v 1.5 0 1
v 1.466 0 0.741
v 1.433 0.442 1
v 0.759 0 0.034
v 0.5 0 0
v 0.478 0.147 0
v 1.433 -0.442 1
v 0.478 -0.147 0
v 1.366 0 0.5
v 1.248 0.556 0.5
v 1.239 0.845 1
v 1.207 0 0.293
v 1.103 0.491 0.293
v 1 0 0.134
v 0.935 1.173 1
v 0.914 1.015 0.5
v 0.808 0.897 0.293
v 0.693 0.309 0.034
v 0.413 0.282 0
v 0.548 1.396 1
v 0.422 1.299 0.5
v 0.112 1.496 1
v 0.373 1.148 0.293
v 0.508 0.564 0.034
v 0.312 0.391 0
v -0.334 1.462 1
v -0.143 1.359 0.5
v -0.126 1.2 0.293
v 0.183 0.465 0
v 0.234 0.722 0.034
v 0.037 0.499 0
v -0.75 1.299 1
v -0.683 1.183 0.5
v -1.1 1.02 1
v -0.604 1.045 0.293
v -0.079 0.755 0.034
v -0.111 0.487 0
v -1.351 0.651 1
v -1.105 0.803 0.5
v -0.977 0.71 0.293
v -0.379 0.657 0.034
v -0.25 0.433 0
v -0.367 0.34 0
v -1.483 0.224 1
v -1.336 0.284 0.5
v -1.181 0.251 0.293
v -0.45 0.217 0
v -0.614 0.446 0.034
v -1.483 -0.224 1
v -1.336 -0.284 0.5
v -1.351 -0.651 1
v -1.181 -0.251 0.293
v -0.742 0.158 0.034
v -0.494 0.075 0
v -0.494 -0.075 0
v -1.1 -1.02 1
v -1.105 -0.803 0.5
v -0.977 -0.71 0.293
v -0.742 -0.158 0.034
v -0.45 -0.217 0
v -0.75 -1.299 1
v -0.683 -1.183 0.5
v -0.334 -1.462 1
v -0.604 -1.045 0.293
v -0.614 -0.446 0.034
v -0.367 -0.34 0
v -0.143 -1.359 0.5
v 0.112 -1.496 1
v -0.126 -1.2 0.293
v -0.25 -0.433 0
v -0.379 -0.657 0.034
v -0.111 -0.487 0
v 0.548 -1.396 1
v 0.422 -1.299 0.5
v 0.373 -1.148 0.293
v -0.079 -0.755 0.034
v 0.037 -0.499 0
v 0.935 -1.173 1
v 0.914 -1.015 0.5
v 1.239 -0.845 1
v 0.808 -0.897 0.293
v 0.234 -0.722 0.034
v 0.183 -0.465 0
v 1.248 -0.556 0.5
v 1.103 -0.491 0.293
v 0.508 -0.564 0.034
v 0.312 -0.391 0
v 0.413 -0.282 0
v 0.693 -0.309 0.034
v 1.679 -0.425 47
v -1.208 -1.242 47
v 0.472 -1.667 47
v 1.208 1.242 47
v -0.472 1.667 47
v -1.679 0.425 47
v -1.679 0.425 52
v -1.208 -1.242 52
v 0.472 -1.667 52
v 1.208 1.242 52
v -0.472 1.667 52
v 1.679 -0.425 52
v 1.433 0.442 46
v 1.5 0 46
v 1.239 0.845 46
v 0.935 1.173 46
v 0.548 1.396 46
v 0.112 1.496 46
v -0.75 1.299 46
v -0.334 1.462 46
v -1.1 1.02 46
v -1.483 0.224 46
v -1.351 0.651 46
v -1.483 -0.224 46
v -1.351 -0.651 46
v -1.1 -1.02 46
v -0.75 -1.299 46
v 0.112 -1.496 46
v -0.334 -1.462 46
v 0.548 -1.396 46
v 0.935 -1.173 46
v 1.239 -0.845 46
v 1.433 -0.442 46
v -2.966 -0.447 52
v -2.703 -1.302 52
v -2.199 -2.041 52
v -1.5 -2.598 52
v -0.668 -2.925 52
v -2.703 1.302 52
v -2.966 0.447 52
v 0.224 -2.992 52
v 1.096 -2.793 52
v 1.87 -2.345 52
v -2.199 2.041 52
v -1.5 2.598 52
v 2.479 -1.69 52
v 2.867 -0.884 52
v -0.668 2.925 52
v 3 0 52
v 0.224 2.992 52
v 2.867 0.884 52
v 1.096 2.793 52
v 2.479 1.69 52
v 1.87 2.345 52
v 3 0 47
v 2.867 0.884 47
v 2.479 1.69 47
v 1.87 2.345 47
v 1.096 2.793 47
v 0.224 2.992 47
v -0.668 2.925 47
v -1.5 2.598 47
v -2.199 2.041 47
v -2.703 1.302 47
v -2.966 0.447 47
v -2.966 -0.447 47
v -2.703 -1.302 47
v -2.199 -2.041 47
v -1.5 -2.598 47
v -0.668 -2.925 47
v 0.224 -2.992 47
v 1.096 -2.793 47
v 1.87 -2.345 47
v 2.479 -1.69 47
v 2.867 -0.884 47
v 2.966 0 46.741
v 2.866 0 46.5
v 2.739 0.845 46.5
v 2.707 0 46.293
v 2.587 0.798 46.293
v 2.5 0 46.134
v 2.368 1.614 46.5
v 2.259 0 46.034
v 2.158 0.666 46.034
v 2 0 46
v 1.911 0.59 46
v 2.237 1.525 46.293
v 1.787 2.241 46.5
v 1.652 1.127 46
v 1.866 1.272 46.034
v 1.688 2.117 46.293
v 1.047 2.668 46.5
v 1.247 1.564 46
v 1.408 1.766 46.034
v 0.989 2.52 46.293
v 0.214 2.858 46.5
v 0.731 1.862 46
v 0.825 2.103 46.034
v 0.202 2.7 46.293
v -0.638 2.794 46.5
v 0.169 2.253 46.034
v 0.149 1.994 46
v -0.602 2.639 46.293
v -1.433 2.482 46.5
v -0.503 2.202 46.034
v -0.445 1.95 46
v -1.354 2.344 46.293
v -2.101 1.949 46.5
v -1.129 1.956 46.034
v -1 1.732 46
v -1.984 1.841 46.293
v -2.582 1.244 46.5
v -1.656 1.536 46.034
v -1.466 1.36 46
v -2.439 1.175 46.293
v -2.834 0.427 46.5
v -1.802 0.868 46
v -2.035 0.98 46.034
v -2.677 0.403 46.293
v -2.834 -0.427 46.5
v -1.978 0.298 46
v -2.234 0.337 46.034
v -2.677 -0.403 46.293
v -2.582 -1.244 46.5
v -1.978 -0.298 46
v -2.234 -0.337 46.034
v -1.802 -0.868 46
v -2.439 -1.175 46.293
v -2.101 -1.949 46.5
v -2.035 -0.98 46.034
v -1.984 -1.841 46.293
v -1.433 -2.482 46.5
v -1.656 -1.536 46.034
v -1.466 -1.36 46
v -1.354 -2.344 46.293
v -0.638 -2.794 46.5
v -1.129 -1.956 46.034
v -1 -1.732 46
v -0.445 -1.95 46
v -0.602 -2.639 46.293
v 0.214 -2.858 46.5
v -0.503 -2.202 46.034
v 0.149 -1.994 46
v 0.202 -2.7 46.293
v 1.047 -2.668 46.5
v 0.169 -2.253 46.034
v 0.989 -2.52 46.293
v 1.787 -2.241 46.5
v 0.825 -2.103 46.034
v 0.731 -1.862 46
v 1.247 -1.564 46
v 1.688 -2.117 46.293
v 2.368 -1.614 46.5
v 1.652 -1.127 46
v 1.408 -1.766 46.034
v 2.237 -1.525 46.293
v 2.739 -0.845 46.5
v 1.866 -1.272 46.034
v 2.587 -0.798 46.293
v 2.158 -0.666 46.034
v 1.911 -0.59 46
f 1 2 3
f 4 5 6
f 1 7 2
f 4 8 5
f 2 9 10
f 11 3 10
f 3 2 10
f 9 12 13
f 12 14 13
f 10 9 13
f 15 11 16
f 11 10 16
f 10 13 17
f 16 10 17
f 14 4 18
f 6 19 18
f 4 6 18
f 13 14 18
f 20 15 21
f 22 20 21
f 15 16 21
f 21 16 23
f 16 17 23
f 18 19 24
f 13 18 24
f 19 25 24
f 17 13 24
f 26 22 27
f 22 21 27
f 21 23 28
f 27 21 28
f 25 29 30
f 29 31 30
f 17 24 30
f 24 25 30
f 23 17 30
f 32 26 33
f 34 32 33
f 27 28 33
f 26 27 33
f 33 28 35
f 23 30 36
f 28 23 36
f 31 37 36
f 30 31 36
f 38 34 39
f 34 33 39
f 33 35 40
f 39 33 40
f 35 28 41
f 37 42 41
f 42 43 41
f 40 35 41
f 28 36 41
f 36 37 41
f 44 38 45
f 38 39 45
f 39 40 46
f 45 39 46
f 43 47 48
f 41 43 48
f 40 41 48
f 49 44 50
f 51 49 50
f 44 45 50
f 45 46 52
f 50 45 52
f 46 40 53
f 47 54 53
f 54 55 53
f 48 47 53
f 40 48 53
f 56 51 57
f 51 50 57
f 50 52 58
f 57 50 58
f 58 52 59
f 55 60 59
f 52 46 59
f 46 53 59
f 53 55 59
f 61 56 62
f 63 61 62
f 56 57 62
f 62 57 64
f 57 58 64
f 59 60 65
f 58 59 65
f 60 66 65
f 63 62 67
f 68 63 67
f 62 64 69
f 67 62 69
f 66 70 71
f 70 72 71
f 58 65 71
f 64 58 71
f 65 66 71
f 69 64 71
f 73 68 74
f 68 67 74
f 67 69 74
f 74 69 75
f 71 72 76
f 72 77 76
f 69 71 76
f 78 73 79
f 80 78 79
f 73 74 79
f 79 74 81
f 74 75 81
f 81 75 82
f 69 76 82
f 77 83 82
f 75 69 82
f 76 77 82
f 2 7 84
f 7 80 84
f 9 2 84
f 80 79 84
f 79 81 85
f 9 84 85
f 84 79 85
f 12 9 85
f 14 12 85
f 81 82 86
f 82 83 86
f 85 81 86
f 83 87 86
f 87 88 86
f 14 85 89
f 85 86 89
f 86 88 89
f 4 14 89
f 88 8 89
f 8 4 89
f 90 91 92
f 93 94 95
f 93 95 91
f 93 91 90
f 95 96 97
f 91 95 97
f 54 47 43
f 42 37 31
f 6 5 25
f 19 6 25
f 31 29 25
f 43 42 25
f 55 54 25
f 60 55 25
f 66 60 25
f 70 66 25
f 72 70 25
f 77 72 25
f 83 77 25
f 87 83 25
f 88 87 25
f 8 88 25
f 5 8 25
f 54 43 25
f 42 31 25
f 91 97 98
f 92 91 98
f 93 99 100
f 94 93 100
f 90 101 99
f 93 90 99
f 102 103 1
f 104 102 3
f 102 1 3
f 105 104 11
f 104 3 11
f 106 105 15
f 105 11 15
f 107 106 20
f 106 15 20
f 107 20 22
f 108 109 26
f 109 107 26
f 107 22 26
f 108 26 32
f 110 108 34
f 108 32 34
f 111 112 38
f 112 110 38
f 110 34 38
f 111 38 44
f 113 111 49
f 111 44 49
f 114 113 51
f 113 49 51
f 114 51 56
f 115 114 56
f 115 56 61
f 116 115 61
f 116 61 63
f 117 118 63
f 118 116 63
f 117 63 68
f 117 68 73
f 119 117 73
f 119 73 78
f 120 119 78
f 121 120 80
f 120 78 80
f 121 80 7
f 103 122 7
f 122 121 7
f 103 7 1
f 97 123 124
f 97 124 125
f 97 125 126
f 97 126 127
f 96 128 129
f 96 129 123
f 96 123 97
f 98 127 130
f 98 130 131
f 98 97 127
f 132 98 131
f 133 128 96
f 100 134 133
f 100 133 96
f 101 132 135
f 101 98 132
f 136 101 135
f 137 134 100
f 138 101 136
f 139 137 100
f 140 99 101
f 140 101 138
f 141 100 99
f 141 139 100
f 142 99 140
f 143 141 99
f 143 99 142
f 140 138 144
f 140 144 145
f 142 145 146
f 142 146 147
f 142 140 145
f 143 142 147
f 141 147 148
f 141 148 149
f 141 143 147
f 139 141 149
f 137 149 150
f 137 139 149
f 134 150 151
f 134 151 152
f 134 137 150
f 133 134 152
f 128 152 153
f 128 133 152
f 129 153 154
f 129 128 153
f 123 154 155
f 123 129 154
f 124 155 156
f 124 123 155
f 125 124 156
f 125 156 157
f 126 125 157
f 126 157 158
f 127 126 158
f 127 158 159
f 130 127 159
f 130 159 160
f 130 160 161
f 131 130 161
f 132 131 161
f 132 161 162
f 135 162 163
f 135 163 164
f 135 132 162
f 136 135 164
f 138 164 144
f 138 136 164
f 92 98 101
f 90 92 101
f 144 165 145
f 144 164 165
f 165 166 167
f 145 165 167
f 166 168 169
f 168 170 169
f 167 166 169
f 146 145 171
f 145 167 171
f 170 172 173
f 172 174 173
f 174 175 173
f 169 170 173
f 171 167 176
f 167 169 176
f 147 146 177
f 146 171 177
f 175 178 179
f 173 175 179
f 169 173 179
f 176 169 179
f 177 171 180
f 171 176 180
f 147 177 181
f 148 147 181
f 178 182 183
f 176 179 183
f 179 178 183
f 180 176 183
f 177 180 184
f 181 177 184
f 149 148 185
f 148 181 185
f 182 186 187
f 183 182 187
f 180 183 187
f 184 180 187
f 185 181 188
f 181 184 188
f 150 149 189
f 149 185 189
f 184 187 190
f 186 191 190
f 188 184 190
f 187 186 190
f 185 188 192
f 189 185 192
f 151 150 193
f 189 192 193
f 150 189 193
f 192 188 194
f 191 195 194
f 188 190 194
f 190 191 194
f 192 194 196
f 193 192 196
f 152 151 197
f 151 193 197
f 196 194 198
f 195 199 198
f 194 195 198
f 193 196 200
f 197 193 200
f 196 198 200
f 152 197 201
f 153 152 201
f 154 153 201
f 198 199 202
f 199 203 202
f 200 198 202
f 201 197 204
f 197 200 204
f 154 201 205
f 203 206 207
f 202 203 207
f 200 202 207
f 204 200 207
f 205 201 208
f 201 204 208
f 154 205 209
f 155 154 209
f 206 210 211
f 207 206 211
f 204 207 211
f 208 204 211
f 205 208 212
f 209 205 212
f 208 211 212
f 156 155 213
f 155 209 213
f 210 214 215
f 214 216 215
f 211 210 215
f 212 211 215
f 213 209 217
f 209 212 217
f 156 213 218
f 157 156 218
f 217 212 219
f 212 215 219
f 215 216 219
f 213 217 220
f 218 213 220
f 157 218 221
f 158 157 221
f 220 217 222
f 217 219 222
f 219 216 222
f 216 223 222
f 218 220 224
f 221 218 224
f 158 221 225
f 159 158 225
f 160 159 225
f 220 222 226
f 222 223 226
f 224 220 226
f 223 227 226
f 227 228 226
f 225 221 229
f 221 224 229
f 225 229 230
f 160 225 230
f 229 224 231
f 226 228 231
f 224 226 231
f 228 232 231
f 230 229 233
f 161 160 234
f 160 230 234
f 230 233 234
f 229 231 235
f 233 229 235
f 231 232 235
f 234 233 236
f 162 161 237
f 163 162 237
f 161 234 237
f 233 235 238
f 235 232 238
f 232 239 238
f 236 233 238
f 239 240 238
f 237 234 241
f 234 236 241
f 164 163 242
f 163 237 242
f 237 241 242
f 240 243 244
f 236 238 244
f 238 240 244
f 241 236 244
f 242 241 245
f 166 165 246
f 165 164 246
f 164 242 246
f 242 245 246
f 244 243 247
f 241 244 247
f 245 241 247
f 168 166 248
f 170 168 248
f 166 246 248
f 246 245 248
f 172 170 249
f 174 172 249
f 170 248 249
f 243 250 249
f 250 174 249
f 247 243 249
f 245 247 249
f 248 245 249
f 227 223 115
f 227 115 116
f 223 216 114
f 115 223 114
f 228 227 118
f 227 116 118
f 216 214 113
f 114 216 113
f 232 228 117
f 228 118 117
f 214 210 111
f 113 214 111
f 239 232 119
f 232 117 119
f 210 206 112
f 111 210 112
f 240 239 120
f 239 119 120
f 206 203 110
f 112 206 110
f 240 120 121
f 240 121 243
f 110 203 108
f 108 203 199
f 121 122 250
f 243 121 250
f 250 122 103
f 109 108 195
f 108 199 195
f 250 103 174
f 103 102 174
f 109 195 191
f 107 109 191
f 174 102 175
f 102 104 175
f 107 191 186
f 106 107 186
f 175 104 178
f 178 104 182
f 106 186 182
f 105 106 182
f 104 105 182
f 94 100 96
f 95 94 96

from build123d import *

# Parameters (mm, degrees)
F0_R     = 1.5
F1_DEPTH = 52
F2_R     = 3
F2_R_2   = 1.5
F3_DEPTH = 6
F5_DEPTH = 5
F6_R     = 1


with BuildPart() as f1:
    # F0 (on Top) → F1 (new body)
    with BuildSketch(Plane.XY):
        Circle(F0_R)
    extrude(amount=F1_DEPTH)

    # F2 (on face) → F3 (join)
    with BuildSketch(Plane.XY.offset(52)):
        Circle(F2_R)
        Circle(F2_R_2, mode=Mode.SUBTRACT)
        Circle(F2_R_2)
    extrude(amount=-F3_DEPTH)

    # F4 (on face) → F5 (cut)
    with BuildSketch(Plane.XY.offset(52)):
        Polygon((0.471543, -1.666628), (1.679113, -0.424946), (1.20757, 1.241682), (-0.471543, 1.666628), (-1.679113, 0.424946), (-1.20757, -1.241682), align=None)
    extrude(amount=-F5_DEPTH, mode=Mode.SUBTRACT)

    # F6
    f6_edges = [f1.edges().sort_by_distance(p)[0] for p in [
        (-1.5, 0, 0),
        (-3, 0, 46),
    ]]
    fillet(f6_edges, radius=F6_R)


solid = f1.part
